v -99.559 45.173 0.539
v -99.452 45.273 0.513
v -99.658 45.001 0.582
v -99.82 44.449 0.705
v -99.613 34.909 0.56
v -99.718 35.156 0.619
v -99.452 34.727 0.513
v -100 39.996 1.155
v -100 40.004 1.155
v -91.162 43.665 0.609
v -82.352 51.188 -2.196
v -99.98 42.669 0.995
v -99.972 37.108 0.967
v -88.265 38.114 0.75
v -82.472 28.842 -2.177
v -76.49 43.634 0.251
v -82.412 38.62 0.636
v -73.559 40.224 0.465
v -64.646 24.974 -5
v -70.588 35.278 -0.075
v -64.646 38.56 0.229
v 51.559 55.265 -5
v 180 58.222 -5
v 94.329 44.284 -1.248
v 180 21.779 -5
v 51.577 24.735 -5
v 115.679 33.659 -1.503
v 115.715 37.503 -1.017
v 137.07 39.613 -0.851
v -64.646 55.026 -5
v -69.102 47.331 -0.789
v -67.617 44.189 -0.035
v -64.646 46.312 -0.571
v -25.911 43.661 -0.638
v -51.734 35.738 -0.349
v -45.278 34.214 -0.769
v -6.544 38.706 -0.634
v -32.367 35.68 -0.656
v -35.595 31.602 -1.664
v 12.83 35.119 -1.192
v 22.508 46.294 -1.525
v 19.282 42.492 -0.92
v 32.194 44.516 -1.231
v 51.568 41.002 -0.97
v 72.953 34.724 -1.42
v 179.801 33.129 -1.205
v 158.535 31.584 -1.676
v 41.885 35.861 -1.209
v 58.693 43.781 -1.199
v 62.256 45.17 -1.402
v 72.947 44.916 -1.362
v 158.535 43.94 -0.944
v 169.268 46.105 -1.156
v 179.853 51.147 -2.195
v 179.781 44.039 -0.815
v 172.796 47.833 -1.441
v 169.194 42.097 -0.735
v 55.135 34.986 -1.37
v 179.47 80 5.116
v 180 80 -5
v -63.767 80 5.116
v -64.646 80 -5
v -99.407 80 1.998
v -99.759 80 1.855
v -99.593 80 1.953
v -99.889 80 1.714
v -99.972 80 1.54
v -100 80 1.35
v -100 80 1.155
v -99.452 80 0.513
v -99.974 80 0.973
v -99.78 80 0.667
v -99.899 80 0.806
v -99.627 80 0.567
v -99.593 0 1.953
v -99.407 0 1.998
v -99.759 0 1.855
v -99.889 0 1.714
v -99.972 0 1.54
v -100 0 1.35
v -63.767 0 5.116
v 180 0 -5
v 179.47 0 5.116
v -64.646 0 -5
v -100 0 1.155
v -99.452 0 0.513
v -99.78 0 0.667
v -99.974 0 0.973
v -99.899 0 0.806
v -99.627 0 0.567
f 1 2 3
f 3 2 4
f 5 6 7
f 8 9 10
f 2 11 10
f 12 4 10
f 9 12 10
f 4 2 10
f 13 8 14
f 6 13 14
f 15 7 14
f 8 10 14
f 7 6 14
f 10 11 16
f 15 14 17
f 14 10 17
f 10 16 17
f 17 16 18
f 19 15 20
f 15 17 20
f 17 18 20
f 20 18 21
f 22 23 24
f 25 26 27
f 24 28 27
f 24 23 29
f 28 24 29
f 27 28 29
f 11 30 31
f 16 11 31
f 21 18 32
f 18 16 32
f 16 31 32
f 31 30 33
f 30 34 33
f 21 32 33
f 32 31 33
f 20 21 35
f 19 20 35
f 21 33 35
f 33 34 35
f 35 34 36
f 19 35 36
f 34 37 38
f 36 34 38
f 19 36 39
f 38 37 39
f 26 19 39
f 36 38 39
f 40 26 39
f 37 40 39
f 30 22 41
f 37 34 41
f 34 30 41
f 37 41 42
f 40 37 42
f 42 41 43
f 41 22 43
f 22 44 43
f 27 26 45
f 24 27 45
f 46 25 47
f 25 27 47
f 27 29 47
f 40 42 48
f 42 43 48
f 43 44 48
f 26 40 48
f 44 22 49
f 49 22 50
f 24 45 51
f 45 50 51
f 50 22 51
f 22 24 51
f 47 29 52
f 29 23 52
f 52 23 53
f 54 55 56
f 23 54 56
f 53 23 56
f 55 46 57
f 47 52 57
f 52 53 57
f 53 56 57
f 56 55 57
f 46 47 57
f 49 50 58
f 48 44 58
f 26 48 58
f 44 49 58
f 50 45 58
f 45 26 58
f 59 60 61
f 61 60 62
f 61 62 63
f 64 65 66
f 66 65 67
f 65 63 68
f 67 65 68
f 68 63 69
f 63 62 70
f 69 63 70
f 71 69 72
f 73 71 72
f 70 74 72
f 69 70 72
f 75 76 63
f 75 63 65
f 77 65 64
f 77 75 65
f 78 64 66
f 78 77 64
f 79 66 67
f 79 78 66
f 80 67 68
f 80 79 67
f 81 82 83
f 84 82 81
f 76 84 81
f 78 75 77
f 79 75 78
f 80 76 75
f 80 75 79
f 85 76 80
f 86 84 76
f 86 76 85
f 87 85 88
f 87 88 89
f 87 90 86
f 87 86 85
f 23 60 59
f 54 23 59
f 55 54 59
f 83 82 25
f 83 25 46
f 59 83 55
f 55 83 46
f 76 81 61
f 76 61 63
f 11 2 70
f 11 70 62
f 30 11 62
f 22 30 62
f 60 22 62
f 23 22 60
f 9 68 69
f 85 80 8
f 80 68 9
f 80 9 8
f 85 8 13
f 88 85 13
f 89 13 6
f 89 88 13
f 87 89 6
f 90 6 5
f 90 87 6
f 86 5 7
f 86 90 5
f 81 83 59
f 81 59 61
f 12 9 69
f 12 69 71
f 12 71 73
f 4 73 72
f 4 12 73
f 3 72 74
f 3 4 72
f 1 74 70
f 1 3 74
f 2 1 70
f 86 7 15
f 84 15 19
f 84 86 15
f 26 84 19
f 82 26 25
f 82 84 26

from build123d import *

# Parameters (mm, degrees)
BOSS_EXTRUDE1_DEPTH = 80


with BuildPart() as part:
    # Sketch1 → Boss-Extrude1 (new body)
    with BuildSketch(Plane(origin=(0, 0, 0), x_dir=(1, 0, 0), z_dir=(0, 1, 0))):
        with BuildLine():
            Line((180, 5), (179.469862502, -5.115626071))
            Line((179.469862502, -5.115626071), (-63.767328769, -5.115626071))
            Line((-63.767328769, -5.115626071), (-99.406651233, -1.997589379))
            ThreePointArc((-99.406651233, -1.997589379), (-99.829230269, -1.789196461), (-100, -1.350062826))
            Line((-100, -1.350062826), (-100, -1.154739941))
            ThreePointArc((-100, -1.154739941), (-99.844263878, -0.732598709), (-99.451682402, -0.512742519))
            Line((-99.451682402, -0.512742519), (-64.645595971, 5))
            Line((-64.645595971, 5), (180, 5))
        make_face()
    extrude(amount=BOSS_EXTRUDE1_DEPTH)

    # Cut-Loft2: read off the stored shape, not the designer's step
    # Cut-Loft2: loft between two sections, ruled curve by curve
    cut_loft2_from = [
        Edge.make_bspline([(-100, 46.372269689, -42.924050086), (-100, 47.27138594, -42.658538849), (-100, 48.210787476, -42.320500231), (-100, 50.149850676, -41.453921439), (-100, 51.149765287, -40.925166444), (-100, 53.169114931, -39.628159499), (-100, 54.18874158, -38.859470423), (-100, 56.178772716, -37.039694285), (-100, 57.149111753, -35.987936251), (-100, 58.941067781, -33.581924282), (-100, 59.762113682, -32.226944596), (-100, 61.133842388, -29.23911219), (-100, 61.683362519, -27.605929091), (-100, 62.216554733, -25.013126268), (-100, 62.345428507, -24.125166051), (-100, 62.496577402, -22.320181761), (-100, 62.518852521, -21.403157688), (-100, 62.447919377, -19.558367046), (-100, 62.354526015, -18.630982172), (-100, 62.052716958, -16.78785196), (-100, 61.844301264, -15.872106621), (-100, 61.313278789, -14.073874119), (-100, 60.990797696, -13.191812573), (-100, 60.242941855, -11.480401071), (-100, 59.817567108, -10.651051116), (-100, 58.87497002, -9.063664977), (-100, 58.358110433, -8.305848706), (-100, 57.250681403, -6.872525569), (-100, 56.660111959, -6.197018701), (-100, 54.80395718, -4.309795913), (-100, 53.45539094, -3.237122381), (-100, 50.680622933, -1.473760637), (-100, 49.255217853, -0.782163442), (-100, 46.443698676, 0.264430993), (-100, 45.057669802, 0.620347796), (-100, 42.398313027, 1.067148265), (-100, 41.124675582, 1.158630823), (-100, 38.724689029, 1.150596935), (-100, 37.597941582, 1.051343402), (-100, 35.499184882, 0.725544061), (-100, 34.526846562, 0.499041204), (-100, 32.72861406, -0.03198127), (-100, 31.789212524, -0.370019888), (-100, 29.850149324, -1.23659868), (-100, 28.850234713, -1.765353674), (-100, 26.830885069, -3.062360619), (-100, 25.81125842, -3.831049696), (-100, 23.821227284, -5.650825833), (-100, 22.850888247, -6.702583867), (-100, 21.058932219, -9.108595836), (-100, 20.237886318, -10.463575522), (-100, 18.866157612, -13.451407929), (-100, 18.316637481, -15.084591028), (-100, 17.783445267, -17.677393851), (-100, 17.654571493, -18.565354067), (-100, 17.503422598, -20.370338357), (-100, 17.481147479, -21.287362431), (-100, 17.552080623, -23.132153073), (-100, 17.645473985, -24.059537946), (-100, 17.947283042, -25.902668159), (-100, 18.155698736, -26.818413497), (-100, 18.686721211, -28.616646), (-100, 19.009202304, -29.498707546), (-100, 19.757058145, -31.210119048), (-100, 20.182432892, -32.039469003), (-100, 21.12502998, -33.626855142), (-100, 21.641889567, -34.384671412), (-100, 22.749318597, -35.81799455), (-100, 23.339888041, -36.493501417), (-100, 25.19604282, -38.380724205), (-100, 26.54460906, -39.453397738), (-100, 29.319377067, -41.216759482), (-100, 30.744782147, -41.908356676), (-100, 33.556301324, -42.954951112), (-100, 34.942330198, -43.310867915), (-100, 37.601686973, -43.757668384), (-100, 38.875324418, -43.849150941), (-100, 41.275310971, -43.841117054), (-100, 42.402058418, -43.74186352), (-100, 44.500815118, -43.416064179), (-100, 45.473153438, -43.189561323), (-100, 46.372269689, -42.924050086)], [0, 0, 0, 0, 0.03125, 0.03125, 0.0625, 0.0625, 0.09375, 0.09375, 0.125, 0.125, 0.15625, 0.15625, 0.1875, 0.1875, 0.203125, 0.203125, 0.21875, 0.21875, 0.234375, 0.234375, 0.25, 0.25, 0.265625, 0.265625, 0.28125, 0.28125, 0.296875, 0.296875, 0.3125, 0.3125, 0.34375, 0.34375, 0.375, 0.375, 0.40625, 0.40625, 0.4375, 0.4375, 0.46875, 0.46875, 0.5, 0.5, 0.53125, 0.53125, 0.5625, 0.5625, 0.59375, 0.59375, 0.625, 0.625, 0.65625, 0.65625, 0.6875, 0.6875, 0.703125, 0.703125, 0.71875, 0.71875, 0.734375, 0.734375, 0.75, 0.75, 0.765625, 0.765625, 0.78125, 0.78125, 0.796875, 0.796875, 0.8125, 0.8125, 0.84375, 0.84375, 0.875, 0.875, 0.90625, 0.90625, 0.9375, 0.9375, 0.96875, 0.96875, 1, 1, 1, 1], 3),
    ]
    cut_loft2_to = [
        Edge.make_bspline([(180, 28.551057955, -78.935198824), (180, 30.147996066, -79.412238075), (180, 31.875323965, -79.820338386), (180, 35.604608971, -80.411256005), (180, 37.607151324, -80.593998796), (180, 41.873728161, -80.621685223), (180, 44.138472267, -80.46616369), (180, 48.868689715, -79.68670829), (180, 51.334716697, -79.061711462), (180, 56.338793625, -77.216810774), (180, 58.876697195, -75.995271668), (180, 63.819442208, -72.875919018), (180, 66.222872399, -70.976485062), (180, 69.533227056, -67.631805591), (180, 70.587261439, -66.435254593), (180, 72.564064486, -63.89331443), (180, 73.486743413, -62.547940775), (180, 75.171328923, -59.731199346), (180, 75.933152653, -58.259880816), (180, 77.272256632, -55.221524011), (180, 77.849475409, -53.654564318), (180, 78.803553913, -50.460688096), (180, 79.18038475, -48.83386828), (180, 79.727221351, -45.558844421), (180, 79.897235414, -43.910739803), (180, 80.033641397, -40.631524344), (180, 80.000075583, -39.000500123), (180, 79.741415418, -35.790779731), (180, 79.516387593, -34.212145749), (180, 78.582975921, -29.599763352), (180, 77.615177464, -26.693271965), (180, 75.193247864, -21.373934955), (180, 73.741185532, -18.960508489), (180, 70.568939332, -14.673166832), (180, 68.849774783, -12.797964612), (180, 65.322122641, -9.551708587), (180, 63.513755151, -8.179462312), (180, 59.931061785, -5.862405409), (180, 58.156397702, -4.916816601), (180, 54.714031128, -3.36540993), (180, 53.045880155, -2.759208753), (180, 49.852003934, -1.80513025), (180, 48.124676035, -1.39702994), (180, 44.395391029, -0.80611232), (180, 42.392848676, -0.623369529), (180, 38.126271839, -0.595683102), (180, 35.861527733, -0.751204636), (180, 31.131310285, -1.530660035), (180, 28.665283303, -2.155656863), (180, 23.661206375, -4.000557551), (180, 21.123302805, -5.222096657), (180, 16.180557792, -8.341449307), (180, 13.777127601, -10.240883263), (180, 10.466772944, -13.585562734), (180, 9.412738561, -14.782113732), (180, 7.435935514, -17.324053895), (180, 6.513256587, -18.66942755), (180, 4.828671077, -21.486168979), (180, 4.066847347, -22.957487509), (180, 2.727743368, -25.995844314), (180, 2.150524591, -27.562804007), (180, 1.196446087, -30.756680229), (180, 0.81961525, -32.383500046), (180, 0.272778649, -35.658523904), (180, 0.102764586, -37.306628522), (180, -0.033641397, -40.585843981), (180, -7.5583e-05, -42.216868202), (180, 0.258584582, -45.426588594), (180, 0.483612407, -47.005222577), (180, 1.417024079, -51.617604973), (180, 2.384822536, -54.52409636), (180, 4.806752136, -59.84343337), (180, 6.258814468, -62.256859836), (180, 9.431060668, -66.544201493), (180, 11.150225217, -68.419403713), (180, 14.677877359, -71.665659739), (180, 16.486244849, -73.037906013), (180, 20.068938215, -75.354962916), (180, 21.843602298, -76.300551724), (180, 25.285968872, -77.851958395), (180, 26.954119845, -78.458159572), (180, 28.551057955, -78.935198824)], [0, 0, 0, 0, 0.03125, 0.03125, 0.0625, 0.0625, 0.09375, 0.09375, 0.125, 0.125, 0.15625, 0.15625, 0.1875, 0.1875, 0.203125, 0.203125, 0.21875, 0.21875, 0.234375, 0.234375, 0.25, 0.25, 0.265625, 0.265625, 0.28125, 0.28125, 0.296875, 0.296875, 0.3125, 0.3125, 0.34375, 0.34375, 0.375, 0.375, 0.40625, 0.40625, 0.4375, 0.4375, 0.46875, 0.46875, 0.5, 0.5, 0.53125, 0.53125, 0.5625, 0.5625, 0.59375, 0.59375, 0.625, 0.625, 0.65625, 0.65625, 0.6875, 0.6875, 0.703125, 0.703125, 0.71875, 0.71875, 0.734375, 0.734375, 0.75, 0.75, 0.765625, 0.765625, 0.78125, 0.78125, 0.796875, 0.796875, 0.8125, 0.8125, 0.84375, 0.84375, 0.875, 0.875, 0.90625, 0.90625, 0.9375, 0.9375, 0.96875, 0.96875, 1, 1, 1, 1], 3),
    ]
    cut_loft2 = Solid(Shell([*[Face.make_surface_from_curves(cut_loft2_from[k], cut_loft2_to[k]) for k in range(1)], Face(Wire(cut_loft2_from)), Face(Wire(cut_loft2_to))]))
    add(cut_loft2, mode=Mode.SUBTRACT)


solid = part.part
